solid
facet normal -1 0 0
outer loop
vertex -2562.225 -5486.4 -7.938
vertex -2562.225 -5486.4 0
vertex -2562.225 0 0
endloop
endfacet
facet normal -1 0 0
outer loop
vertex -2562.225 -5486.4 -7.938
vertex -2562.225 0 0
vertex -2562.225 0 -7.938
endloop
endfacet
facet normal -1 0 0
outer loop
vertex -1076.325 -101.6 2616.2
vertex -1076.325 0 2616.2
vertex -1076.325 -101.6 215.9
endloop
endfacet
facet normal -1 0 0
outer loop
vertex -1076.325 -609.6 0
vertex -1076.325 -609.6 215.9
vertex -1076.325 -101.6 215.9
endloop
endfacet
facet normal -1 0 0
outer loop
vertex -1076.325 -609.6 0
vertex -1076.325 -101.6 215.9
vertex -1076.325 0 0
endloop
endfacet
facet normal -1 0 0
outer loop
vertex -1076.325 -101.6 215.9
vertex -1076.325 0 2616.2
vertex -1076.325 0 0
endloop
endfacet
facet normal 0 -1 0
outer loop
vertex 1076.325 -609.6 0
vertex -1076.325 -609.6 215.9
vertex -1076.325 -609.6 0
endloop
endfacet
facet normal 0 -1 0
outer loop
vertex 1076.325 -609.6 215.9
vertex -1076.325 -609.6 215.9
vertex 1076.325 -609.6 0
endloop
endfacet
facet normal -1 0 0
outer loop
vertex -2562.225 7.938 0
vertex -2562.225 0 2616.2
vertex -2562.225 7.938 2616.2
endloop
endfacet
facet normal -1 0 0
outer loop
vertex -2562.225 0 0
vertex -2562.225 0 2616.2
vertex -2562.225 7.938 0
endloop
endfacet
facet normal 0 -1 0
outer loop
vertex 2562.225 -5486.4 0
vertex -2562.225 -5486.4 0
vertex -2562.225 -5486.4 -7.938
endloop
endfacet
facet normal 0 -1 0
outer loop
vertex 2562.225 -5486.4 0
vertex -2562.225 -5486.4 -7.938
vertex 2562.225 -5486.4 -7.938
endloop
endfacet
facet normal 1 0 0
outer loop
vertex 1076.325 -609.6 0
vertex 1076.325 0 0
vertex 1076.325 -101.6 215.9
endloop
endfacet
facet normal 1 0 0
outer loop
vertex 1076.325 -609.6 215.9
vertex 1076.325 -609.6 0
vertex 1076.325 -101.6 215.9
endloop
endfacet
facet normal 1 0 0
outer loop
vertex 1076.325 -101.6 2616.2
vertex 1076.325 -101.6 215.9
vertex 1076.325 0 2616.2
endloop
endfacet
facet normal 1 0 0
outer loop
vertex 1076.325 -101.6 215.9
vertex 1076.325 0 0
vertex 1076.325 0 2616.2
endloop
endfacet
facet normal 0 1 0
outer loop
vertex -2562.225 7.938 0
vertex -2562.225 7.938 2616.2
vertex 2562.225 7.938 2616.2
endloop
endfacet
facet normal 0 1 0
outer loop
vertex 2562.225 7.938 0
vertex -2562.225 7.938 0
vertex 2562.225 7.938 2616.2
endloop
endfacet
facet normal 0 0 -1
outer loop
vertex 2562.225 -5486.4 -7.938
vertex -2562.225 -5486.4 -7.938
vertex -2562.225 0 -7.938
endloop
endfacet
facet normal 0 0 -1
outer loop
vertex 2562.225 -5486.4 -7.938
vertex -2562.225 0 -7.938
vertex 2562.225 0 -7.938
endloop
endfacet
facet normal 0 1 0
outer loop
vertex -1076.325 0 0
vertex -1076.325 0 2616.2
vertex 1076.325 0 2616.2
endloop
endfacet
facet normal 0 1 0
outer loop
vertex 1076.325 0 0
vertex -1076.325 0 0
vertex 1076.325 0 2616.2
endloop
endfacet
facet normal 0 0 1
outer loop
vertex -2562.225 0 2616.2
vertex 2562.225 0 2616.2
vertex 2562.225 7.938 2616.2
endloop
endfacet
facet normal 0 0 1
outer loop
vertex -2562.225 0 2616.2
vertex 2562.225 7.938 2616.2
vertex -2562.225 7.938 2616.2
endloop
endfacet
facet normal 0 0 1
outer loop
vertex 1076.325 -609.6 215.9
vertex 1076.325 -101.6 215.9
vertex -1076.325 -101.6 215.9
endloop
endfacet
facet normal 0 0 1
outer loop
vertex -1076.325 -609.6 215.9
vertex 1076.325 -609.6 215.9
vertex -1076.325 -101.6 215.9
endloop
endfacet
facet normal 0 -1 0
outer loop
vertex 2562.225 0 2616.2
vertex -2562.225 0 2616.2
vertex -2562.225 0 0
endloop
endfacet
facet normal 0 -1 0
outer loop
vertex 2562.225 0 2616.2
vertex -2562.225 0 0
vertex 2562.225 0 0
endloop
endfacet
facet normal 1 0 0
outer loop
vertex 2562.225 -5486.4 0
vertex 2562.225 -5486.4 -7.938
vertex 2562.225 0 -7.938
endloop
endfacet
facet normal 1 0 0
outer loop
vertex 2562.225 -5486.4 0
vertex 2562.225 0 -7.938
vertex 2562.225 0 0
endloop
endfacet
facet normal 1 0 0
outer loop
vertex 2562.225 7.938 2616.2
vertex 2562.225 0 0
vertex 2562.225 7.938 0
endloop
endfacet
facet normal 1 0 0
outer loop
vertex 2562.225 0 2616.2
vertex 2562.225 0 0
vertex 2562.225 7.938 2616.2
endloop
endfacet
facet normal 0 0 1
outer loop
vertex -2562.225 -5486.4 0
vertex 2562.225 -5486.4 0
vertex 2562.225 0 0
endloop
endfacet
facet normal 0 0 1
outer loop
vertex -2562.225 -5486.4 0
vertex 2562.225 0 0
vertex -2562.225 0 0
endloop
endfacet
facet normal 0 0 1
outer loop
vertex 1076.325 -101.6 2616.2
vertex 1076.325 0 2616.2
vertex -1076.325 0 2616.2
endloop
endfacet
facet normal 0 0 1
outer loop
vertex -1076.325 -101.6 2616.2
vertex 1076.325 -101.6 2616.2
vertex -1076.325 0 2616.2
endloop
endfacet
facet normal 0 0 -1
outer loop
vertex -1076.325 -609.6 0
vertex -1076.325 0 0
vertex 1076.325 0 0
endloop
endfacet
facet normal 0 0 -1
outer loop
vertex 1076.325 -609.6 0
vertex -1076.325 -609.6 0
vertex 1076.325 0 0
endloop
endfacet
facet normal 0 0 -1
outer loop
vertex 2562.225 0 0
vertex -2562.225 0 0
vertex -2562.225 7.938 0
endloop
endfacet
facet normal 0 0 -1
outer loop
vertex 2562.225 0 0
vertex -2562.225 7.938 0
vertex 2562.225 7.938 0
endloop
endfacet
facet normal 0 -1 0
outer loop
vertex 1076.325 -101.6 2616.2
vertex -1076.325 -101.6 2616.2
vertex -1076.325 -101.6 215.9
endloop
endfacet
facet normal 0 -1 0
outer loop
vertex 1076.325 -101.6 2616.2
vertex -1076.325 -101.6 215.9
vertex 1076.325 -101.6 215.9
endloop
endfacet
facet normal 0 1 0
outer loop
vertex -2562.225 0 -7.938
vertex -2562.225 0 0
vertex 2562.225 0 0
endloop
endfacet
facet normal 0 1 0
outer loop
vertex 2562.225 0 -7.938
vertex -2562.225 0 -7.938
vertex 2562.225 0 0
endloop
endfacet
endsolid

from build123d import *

# Parameters (mm, degrees)
F1_DEPTH = 5486.4
F0_W     = 1076.325
F0_H     = 215.9
F2_DEPTH = 609.6
F3_DEPTH = 101.6
F5_DEPTH = 7.9375


# Not quite as in the source:
# - a length typed as a fraction of an inch, garbled in the dataset ("3 / 203.2 mm" for 3/8 in), is restored


with BuildPart() as f1:
    # F0 (on Front) → F1 (new body)
    with BuildSketch(Plane.XZ):
        Polygon((-2562.225, 0), (-2562.225, -7.9375), (2562.225, -7.9375), (2562.225, 0), (1076.325, 0), (0, 0), (-1076.325, 0), align=None)
    extrude(amount=F1_DEPTH)


with BuildPart() as f2:
    # F0 (on Front) → F2 (new body)
    with BuildSketch(Plane.XZ):
        with Locations((538.1625, 107.95)):
            Rectangle(F0_W, F0_H)
        with Locations((-538.1625, 107.95)):
            Rectangle(F0_W, F0_H)
    extrude(amount=F2_DEPTH)

    # F0 (on Front) → F3 (join)
    with BuildSketch(Plane.XZ):
        Polygon((-1076.325, 2616.2), (-1076.325, 215.9), (0, 215.9), (1076.325, 215.9), (1076.325, 2616.2), align=None)
    extrude(amount=F3_DEPTH)


with BuildPart() as f5:
    # F4 (on Front) → F5 (new body)
    with BuildSketch(Plane.XZ):
        Polygon((-2562.225, 2616.2), (-2562.225, 0), (2562.225, 0), (2562.225, 2616.2), (1076.325, 2616.2), (-1076.325, 2616.2), align=None)
    extrude(amount=-F5_DEPTH)


solid = Compound([f1.part, f2.part, f5.part])
